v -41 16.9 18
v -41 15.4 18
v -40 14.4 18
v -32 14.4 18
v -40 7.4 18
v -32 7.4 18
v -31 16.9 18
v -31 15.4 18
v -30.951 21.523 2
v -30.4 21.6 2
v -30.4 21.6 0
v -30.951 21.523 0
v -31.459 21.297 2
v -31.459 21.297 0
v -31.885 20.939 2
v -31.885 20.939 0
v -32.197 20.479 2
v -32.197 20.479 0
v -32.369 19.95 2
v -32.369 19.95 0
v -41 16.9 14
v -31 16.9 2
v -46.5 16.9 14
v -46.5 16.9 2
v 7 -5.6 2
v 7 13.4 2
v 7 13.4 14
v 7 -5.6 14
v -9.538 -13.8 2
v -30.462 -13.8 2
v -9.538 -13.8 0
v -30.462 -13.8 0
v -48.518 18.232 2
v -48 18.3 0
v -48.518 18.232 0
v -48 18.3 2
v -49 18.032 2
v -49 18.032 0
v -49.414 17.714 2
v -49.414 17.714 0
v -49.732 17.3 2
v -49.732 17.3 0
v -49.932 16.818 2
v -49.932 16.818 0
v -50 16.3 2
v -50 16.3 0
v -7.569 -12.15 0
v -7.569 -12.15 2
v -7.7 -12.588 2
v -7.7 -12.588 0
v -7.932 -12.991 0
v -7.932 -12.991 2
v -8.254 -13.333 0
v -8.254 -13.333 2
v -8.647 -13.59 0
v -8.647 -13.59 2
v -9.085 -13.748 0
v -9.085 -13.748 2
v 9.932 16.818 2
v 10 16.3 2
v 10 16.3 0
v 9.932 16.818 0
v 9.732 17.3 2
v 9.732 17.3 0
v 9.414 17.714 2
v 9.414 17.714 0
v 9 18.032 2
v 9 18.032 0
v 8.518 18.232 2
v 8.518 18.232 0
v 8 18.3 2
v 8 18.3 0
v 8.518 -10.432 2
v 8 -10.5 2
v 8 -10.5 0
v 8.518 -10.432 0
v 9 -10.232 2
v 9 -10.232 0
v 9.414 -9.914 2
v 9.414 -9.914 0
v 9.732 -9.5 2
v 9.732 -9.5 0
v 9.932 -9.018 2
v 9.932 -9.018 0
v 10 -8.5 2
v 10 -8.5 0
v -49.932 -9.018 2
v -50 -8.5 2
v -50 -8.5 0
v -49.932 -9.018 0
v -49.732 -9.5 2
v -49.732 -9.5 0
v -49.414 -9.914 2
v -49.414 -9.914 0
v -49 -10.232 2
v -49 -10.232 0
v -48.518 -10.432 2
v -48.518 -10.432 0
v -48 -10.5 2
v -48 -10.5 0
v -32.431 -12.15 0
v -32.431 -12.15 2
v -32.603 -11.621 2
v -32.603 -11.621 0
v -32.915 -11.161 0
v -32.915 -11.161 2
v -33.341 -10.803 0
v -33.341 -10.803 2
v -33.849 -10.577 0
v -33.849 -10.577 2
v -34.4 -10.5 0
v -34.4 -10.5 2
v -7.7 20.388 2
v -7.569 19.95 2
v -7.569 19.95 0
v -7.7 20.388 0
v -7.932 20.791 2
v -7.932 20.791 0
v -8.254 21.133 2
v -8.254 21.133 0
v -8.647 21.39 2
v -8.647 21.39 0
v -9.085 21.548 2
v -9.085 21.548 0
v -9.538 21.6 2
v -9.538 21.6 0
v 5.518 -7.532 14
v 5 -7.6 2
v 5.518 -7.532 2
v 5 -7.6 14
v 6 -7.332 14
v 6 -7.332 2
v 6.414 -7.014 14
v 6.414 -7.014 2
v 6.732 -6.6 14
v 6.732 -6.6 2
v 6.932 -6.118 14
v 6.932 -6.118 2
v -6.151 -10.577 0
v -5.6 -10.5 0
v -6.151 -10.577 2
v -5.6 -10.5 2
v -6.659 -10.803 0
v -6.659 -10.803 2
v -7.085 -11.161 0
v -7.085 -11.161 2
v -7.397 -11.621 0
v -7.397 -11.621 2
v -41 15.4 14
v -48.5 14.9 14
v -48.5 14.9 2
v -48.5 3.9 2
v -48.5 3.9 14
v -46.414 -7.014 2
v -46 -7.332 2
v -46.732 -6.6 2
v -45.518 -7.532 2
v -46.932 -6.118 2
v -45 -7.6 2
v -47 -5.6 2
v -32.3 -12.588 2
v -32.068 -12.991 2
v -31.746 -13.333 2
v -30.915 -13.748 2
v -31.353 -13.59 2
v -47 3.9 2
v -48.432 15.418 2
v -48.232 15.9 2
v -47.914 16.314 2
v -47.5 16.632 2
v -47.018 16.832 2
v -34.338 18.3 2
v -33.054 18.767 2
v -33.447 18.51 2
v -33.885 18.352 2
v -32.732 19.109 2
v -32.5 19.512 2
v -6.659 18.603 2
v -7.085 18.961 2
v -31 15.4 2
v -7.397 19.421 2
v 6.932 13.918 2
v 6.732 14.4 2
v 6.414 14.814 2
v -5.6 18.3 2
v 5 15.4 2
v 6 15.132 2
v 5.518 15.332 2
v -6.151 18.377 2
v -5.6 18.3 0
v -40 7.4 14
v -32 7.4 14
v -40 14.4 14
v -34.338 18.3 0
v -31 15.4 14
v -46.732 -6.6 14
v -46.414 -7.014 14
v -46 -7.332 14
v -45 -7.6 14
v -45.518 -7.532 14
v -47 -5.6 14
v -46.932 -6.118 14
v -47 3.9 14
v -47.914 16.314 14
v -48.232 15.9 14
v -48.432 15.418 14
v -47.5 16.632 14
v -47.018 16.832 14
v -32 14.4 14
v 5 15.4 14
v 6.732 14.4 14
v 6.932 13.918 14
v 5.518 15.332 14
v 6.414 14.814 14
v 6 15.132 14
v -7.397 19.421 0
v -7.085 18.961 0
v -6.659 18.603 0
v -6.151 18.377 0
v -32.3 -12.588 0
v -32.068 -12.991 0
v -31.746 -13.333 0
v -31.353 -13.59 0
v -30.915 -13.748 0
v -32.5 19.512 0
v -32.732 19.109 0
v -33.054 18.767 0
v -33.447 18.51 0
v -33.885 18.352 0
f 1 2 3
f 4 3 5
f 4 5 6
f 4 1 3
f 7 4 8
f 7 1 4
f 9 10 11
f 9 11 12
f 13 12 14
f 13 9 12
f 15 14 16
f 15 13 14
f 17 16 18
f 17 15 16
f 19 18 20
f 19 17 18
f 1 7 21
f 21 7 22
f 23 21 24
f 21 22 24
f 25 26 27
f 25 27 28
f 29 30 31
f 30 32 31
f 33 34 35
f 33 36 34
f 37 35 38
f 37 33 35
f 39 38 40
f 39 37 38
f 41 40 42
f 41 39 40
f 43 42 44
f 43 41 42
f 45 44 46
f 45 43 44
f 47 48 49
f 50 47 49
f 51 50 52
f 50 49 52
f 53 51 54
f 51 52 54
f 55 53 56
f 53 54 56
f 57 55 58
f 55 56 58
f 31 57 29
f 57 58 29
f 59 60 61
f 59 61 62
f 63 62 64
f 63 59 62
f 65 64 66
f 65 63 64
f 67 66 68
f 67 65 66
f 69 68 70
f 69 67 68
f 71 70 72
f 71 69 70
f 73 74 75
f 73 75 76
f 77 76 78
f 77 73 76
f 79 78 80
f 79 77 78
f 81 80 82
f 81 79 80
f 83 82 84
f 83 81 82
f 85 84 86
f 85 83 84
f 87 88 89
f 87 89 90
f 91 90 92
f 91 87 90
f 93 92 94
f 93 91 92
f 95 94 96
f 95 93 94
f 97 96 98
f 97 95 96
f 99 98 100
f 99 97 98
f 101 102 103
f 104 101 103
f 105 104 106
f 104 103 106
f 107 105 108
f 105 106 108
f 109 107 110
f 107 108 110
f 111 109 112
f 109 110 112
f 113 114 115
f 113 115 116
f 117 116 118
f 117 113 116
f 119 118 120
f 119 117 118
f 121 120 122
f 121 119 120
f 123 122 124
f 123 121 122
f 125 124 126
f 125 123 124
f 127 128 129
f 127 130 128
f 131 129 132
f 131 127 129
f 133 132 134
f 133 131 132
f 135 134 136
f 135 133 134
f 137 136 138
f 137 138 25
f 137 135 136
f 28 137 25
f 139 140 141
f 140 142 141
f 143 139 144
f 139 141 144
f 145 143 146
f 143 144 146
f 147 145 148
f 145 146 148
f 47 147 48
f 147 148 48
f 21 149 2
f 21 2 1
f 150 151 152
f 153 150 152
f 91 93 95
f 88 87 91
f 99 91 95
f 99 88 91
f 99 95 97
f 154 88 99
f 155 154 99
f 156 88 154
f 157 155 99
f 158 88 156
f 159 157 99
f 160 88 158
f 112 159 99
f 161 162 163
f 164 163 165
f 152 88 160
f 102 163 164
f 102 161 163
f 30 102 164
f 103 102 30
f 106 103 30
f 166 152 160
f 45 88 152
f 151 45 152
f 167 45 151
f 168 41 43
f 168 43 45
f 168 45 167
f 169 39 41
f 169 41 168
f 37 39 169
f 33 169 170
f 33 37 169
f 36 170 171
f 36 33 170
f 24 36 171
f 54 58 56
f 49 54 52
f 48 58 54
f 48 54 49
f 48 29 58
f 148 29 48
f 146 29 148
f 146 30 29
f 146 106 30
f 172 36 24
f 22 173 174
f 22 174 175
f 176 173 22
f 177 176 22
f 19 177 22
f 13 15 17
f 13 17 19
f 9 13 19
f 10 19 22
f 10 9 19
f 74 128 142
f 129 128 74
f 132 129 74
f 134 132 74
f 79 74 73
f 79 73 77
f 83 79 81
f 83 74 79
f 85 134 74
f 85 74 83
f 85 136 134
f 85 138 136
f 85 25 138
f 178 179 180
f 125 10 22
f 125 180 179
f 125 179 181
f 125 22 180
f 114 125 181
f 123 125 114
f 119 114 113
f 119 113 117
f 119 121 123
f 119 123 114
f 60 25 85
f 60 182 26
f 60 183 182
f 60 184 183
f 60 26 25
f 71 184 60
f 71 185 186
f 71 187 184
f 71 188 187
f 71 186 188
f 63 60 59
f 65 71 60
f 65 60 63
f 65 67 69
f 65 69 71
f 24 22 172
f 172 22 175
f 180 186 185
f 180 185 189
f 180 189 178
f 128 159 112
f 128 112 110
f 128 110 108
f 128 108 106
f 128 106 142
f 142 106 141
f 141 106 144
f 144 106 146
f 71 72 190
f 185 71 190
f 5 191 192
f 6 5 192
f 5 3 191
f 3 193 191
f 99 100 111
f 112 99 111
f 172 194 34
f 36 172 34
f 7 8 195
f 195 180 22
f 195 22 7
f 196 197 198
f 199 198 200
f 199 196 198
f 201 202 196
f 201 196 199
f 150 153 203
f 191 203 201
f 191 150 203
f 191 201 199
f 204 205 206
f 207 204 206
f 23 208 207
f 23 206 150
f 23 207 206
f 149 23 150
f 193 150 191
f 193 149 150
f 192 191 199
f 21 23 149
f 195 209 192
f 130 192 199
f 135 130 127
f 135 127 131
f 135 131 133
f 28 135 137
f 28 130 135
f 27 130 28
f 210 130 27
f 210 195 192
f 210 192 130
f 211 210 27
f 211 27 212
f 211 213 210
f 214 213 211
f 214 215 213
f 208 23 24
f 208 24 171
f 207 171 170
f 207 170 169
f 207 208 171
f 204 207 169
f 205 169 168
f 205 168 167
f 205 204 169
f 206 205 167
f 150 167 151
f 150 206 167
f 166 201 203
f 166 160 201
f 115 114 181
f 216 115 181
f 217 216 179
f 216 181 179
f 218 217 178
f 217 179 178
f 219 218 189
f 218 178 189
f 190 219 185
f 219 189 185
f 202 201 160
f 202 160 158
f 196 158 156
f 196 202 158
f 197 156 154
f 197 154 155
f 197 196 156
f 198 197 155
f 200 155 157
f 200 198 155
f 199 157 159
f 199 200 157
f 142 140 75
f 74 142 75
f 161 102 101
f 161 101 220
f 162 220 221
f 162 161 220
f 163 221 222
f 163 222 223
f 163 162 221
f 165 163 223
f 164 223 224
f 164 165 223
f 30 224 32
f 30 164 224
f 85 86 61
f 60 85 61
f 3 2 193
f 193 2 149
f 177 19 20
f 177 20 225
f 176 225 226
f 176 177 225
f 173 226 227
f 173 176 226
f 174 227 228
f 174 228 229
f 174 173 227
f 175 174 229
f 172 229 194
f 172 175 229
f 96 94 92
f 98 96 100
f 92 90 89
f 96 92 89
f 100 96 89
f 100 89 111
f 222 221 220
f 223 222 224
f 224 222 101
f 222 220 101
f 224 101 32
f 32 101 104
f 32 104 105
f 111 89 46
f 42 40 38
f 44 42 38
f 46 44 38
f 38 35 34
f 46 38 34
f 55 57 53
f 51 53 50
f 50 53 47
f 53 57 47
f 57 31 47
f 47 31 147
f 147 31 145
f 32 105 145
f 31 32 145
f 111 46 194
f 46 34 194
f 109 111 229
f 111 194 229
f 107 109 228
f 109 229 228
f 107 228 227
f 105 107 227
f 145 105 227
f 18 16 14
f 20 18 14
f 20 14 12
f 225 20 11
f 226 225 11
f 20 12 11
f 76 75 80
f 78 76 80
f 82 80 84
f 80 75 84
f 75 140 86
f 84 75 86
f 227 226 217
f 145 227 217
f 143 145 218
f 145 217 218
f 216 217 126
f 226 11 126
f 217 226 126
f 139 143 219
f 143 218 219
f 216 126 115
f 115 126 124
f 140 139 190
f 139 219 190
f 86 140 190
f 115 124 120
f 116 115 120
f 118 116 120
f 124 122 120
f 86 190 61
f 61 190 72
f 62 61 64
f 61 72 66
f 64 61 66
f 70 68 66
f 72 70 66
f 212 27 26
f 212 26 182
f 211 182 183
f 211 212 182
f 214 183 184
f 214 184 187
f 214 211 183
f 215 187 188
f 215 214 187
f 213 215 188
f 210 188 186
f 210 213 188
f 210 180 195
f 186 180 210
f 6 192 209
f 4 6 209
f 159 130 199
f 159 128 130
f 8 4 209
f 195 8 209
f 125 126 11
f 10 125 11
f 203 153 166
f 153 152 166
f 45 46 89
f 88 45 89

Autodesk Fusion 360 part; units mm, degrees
sketch "Sketch1" plane through (0, 0, 0) normal (0, 0, 1) x (1, 0, 0)
  line L0 (-50, 18.3) -> (-50, -10.5)
  line L1 (-50, -10.5) -> (-32.4, -10.5)
  line L2 (-32.4, -10.5) -> (-32.4, -13.8)
  line L3 (-32.4, -13.8) -> (-7.6, -13.8)
  line L4 (-7.6, -13.8) -> (-7.6, -10.5)
  line L5 (-7.6, -10.5) -> (10, -10.5)
  line L6 (10, -10.5) -> (10, 18.3)
  line L7 (10, 18.3) -> (-7.6, 18.3)
  line L8 (-7.6, 18.3) -> (-7.6, 21.6)
  line L9 (-7.6, 21.6) -> (-32.4, 21.6)
  line L10 (-32.4, 21.6) -> (-32.4, 18.3)
  line L11 (-32.4, 18.3) -> (-50, 18.3)
  line L12 (-47, 15.4) -> (7, 15.4)
  line L13 (7, 15.4) -> (7, -7.6)
  line L14 (7, -7.6) -> (-47, -7.6)
  line L15 (-47, -7.6) -> (-47, 15.4)
  line L16 (-50, 3.9) -> (-47, 3.9)
  line L17 (-20, 15.4) -> (-20, 21.6)
  line L18 (-40, 15.4) -> (-40, 7.4)
  line L19 (-40, 7.4) -> (-32, 7.4)
  line L20 (-32, 7.4) -> (-32, 15.4)
  line L21 (-45, -6.6) -> (5, -6.6)
  line L22 (5, -6.6) -> (5, -4.1)
  line L23 (5, -4.1) -> (-45, -4.1)
  line L24 (-45, -4.1) -> (-45, -6.6)
  line L25 (-20, -6.6) -> (-20, -7.6)
  line L26 (-45, 14.4) -> (5, 14.4)
  line L27 (5, 14.4) -> (5, 11.9)
  line L28 (-45, 11.9) -> (-45, 14.4)
  line L29 (5, 11.9) -> (-45, 11.9)
  line L30 (-45, 11.9) -> (-45, -4.1)
  line L31 (5, 11.9) -> (5, -4.1)
  line L32 (-31, 15.4) -> (-31, 16.9)
  line L33 (-31, 16.9) -> (-48.5, 16.9)
  line L34 (-48.5, 16.9) -> (-48.5, -4.5956)
  line L35 (-48.5, -4.5956) -> (-47, -4.5956)
  line L36 (-41, 15.4) -> (-41, 16.9)
  dimension "d1" = 60
  dimension "d2" = 24.8
  dimension "d3" = 28.8
  dimension "d4" = 35.4
  dimension "d8" = 23
  dimension "d9" = 54
  dimension "d10" = 8
  dimension "d11" = 8
  dimension "d12" = 7
  dimension "d13" = 1
  dimension "d14" = 2.5
  dimension "d15" = 50
  dimension "d153" = 1.5
  dimension "d154" = 1.5
  dimension "d155" = 1
  dimension "d156" = 1
extrude "Extrude2" add sketch "Sketch1" along normal blind 18 contours L12 L32 L33 L36 | L12 L18 L20 L26 | L18 L20 L26 L29 | L18 L19 L20 L29
extrude "Extrude3" add sketch "Sketch1" along normal blind 14 contours L12 L15 L16 L33 L34 L36 | L12 L14 L15 L18 L21 L24 L25 L26 L28 L30 | L12 L13 L14 L20 L21 L22 L25 L26 L27 L31 | L21 L22 L23 L24 | L18 L26 L28 L29 | L20 L26 L27 L29 | L18 L19 L20 L23 L29 L30 L31
extrude "Extrude5" add sketch "Sketch1" along normal blind 2 contours L0 L9 L10 L11 L12 L16 L17 L32 L33 L34 | L0 L1 L2 L3 L4 L5 L6 L7 L8 L9 L12 L13 L14 L15 L16 L17 L34 L35 | L12 L15 L16 L33 L34 L36 | L15 L16 L34 L35 | L12 L14 L15 L18 L21 L24 L25 L26 L28 L30 | L12 L32 L33 L36 | L12 L13 L14 L20 L21 L22 L25 L26 L27 L31 | L12 L18 L20 L26 | L18 L19 L20 L29 | L18 L19 L20 L23 L29 L30 L31
chamfer "Chamfer5" distance 1 angle 45 2 edges at (-40, 15.4, 16) (-32, 15.4, 16)
fillet "Fillet2" radius 2 12 edges at (-7.6, 18.3, 1) (-7.6, 21.6, 1) (-32.4, 21.6, 1) (-32.4, 18.3, 1) (-50, 18.3, 1) (-50, -10.5, 1) (-32.4, -10.5, 1) (-32.4, -13.8, 1) (-7.6, -10.5, 1) (-7.6, -13.8, 1) (10, -10.5, 1) (10, 18.3, 1)
fillet "Fillet26" radius 2 4 edges at (7, 15.4, 8) (7, -7.6, 8) (-47, -7.6, 8) (-48.5, 16.9, 8)
